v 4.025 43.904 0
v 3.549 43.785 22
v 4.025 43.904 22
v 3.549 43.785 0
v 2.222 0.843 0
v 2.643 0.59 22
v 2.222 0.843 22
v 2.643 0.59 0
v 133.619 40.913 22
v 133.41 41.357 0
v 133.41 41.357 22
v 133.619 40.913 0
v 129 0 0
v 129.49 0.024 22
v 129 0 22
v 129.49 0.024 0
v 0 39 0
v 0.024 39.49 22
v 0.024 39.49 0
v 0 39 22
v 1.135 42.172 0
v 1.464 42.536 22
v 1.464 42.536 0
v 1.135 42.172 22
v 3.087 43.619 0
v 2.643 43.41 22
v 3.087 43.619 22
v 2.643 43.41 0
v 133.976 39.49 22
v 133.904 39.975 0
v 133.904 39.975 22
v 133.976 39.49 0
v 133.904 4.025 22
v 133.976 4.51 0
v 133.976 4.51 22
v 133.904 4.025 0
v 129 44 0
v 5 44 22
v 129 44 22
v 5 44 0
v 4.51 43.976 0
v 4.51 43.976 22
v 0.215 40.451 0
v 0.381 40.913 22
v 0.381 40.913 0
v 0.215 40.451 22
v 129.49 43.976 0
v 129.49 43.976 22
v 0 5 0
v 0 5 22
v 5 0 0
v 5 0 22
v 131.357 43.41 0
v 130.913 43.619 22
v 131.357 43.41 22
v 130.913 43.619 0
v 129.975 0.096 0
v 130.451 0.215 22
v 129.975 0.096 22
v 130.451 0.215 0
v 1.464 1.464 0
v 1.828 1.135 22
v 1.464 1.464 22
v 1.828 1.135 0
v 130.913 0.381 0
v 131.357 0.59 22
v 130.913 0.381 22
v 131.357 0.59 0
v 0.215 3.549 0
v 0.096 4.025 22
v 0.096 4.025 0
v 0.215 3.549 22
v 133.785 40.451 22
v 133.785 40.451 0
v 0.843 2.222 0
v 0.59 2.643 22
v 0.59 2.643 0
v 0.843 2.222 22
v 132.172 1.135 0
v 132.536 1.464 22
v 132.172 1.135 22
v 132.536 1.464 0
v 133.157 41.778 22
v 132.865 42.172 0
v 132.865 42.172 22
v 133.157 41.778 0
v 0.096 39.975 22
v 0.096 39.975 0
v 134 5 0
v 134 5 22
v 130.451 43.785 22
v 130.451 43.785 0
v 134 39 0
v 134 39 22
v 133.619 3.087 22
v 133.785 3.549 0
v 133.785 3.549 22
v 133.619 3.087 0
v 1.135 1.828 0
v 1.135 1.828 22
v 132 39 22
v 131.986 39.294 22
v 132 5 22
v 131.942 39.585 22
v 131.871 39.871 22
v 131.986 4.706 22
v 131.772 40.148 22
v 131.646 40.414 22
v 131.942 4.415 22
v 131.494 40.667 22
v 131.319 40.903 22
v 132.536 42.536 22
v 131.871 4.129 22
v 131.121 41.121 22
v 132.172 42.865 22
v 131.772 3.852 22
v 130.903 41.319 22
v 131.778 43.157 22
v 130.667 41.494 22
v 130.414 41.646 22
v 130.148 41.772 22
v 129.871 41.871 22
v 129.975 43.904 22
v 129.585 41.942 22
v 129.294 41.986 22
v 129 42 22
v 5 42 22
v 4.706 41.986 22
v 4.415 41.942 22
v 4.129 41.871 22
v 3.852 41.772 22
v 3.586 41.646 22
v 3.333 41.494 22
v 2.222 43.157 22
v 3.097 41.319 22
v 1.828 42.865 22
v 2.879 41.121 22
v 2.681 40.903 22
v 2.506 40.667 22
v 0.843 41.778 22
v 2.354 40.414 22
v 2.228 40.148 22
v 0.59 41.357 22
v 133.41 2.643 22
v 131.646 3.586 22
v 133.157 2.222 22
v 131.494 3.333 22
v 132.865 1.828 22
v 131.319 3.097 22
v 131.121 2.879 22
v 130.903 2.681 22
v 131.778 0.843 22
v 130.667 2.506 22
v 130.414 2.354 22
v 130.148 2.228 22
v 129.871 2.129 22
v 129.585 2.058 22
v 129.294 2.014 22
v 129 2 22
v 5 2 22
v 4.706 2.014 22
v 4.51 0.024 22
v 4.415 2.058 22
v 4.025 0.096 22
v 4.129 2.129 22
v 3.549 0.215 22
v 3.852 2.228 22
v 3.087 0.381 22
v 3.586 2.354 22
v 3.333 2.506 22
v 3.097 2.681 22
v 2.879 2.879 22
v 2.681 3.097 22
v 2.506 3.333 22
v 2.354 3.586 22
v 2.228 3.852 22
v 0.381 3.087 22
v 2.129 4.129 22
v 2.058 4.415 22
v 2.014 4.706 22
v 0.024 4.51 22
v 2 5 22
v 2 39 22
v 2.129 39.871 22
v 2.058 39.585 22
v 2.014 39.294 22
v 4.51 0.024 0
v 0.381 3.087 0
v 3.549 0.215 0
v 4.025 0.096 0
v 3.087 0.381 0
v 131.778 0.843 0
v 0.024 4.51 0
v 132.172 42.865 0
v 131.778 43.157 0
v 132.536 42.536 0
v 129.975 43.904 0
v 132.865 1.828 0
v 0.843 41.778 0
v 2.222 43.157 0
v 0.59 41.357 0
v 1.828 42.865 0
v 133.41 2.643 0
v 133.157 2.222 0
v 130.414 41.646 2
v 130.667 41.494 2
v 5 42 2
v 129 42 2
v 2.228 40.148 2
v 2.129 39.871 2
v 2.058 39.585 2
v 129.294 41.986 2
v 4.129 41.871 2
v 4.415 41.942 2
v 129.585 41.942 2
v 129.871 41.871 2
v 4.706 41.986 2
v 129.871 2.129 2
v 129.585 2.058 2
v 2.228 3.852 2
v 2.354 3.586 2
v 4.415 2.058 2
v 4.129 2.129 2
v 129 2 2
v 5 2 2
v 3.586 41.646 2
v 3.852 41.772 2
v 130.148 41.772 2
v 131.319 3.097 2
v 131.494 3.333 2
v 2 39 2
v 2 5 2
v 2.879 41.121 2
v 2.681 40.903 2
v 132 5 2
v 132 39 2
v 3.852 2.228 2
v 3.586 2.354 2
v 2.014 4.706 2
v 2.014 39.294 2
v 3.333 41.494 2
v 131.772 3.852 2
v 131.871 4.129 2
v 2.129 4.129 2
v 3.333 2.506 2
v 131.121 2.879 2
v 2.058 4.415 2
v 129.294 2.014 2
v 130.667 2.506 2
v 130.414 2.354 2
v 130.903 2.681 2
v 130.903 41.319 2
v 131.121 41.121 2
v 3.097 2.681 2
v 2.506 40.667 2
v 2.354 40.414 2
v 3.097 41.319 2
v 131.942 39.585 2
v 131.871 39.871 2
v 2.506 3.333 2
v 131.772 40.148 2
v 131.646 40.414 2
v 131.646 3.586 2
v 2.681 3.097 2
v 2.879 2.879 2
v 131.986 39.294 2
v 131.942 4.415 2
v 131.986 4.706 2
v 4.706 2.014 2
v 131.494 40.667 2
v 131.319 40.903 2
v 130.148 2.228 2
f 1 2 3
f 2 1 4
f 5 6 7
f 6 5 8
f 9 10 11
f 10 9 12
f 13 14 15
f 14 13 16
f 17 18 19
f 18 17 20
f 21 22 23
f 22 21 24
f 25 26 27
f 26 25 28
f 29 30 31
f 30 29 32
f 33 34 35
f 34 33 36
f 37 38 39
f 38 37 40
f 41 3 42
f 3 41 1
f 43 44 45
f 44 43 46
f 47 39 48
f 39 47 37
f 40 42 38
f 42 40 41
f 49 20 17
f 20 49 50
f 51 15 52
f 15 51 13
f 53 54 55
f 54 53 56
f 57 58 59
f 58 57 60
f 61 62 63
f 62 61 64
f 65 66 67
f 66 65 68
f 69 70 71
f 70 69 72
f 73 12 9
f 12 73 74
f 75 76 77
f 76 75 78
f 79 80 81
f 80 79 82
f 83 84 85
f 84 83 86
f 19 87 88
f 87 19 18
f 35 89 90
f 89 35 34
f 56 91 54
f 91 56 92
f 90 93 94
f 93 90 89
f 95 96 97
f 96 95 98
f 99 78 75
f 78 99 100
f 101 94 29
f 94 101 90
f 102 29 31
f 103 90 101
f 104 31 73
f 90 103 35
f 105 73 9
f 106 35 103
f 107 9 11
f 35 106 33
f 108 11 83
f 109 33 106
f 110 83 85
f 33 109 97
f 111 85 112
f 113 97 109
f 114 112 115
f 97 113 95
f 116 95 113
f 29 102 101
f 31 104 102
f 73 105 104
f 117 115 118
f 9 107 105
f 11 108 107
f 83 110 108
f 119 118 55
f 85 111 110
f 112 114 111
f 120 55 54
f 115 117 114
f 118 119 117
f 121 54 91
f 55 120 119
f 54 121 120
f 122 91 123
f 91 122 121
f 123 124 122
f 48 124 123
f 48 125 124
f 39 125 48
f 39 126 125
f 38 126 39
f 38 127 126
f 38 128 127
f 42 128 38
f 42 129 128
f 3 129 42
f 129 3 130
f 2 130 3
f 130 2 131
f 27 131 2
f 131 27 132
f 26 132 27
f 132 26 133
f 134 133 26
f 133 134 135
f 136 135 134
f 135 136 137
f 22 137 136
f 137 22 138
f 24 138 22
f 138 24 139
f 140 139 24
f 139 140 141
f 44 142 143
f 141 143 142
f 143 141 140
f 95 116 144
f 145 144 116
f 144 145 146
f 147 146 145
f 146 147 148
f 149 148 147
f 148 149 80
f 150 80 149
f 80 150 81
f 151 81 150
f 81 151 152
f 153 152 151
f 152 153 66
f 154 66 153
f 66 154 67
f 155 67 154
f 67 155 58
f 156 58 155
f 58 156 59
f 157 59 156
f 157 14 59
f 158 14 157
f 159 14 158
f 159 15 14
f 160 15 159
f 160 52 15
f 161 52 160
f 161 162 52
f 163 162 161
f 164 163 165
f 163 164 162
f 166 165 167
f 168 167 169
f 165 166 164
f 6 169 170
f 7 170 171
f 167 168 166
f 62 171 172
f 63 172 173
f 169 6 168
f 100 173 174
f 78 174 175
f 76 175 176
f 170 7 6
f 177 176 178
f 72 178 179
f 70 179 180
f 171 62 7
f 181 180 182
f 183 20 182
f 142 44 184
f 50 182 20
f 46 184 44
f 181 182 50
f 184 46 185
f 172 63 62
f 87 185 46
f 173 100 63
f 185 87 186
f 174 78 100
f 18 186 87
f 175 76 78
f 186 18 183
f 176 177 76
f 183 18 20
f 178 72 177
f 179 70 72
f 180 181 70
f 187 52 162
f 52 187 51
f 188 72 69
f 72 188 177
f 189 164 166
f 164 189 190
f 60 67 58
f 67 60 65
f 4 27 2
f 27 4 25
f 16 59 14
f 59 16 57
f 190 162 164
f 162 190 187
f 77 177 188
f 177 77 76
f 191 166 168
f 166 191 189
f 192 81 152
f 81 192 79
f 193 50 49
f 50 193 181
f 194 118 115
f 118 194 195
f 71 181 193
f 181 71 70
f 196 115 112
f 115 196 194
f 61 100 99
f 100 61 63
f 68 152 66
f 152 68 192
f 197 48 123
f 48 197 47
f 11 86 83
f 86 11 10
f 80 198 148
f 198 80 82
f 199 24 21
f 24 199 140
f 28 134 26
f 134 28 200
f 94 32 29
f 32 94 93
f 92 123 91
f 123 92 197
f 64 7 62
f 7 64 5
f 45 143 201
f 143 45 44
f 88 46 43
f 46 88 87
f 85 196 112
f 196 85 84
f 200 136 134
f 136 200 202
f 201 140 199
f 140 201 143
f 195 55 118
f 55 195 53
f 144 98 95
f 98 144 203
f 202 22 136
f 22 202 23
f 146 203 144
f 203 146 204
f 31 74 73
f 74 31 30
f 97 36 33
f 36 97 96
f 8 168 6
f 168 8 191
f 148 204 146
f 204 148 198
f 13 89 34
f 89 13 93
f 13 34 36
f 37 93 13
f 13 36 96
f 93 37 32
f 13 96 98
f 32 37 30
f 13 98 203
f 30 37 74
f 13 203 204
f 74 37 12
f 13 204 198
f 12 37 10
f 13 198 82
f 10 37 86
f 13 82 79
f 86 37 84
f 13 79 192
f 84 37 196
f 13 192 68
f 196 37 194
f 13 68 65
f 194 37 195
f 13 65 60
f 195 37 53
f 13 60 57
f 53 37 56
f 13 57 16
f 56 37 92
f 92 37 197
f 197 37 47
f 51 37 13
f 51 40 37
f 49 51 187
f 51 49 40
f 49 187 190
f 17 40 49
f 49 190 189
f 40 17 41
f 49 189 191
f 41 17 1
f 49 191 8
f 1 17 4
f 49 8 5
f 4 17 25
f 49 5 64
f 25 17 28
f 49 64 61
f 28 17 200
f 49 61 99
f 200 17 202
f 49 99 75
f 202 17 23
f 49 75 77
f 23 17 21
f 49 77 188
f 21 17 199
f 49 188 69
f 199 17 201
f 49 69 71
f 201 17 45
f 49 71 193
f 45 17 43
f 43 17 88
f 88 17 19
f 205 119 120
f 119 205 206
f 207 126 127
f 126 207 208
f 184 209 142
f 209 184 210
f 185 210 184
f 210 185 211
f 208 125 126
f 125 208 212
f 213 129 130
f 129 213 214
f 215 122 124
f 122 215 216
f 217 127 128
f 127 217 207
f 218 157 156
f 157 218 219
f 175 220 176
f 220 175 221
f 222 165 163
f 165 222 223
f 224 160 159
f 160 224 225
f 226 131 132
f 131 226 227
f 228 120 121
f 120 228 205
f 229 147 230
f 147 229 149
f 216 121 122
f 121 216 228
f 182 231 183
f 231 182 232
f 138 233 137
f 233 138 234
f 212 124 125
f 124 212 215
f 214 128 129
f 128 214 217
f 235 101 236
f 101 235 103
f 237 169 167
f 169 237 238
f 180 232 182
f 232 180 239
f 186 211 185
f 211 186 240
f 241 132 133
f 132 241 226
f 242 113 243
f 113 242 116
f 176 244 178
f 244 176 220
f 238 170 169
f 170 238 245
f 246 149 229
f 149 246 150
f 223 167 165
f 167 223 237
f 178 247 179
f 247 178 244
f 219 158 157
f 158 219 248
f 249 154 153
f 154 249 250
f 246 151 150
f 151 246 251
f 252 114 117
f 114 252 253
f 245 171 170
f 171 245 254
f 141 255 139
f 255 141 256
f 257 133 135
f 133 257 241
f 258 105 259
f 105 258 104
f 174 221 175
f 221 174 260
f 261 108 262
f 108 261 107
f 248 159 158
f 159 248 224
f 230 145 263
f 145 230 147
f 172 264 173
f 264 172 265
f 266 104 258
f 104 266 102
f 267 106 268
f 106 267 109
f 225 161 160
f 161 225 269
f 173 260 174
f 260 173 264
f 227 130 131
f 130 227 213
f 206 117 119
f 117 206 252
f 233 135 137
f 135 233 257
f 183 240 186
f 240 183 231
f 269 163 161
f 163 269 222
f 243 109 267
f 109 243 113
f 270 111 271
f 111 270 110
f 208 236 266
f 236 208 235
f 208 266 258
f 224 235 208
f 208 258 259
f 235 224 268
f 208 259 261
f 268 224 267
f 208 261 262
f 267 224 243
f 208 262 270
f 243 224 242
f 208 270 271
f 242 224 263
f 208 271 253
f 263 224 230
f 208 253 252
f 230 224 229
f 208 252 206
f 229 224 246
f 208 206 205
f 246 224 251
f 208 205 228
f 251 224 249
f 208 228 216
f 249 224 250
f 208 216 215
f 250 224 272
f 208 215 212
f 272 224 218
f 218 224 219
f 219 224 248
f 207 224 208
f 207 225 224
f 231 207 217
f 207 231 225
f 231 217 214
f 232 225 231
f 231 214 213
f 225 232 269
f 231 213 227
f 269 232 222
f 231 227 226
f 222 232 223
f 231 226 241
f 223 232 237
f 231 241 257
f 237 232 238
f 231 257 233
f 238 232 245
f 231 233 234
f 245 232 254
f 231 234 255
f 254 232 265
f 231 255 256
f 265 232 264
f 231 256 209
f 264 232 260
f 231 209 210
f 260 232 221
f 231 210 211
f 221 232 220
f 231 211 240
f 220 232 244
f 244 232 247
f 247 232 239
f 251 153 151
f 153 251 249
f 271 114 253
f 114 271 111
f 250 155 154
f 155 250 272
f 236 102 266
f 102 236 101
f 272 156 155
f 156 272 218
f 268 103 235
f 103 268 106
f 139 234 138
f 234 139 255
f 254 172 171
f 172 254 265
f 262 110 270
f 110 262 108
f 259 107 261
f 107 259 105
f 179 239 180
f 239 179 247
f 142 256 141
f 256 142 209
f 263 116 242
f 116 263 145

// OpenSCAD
$fn=64;
$inner_x=130; //Width in mm
$inner_y=40; //Depth in mm
$inner_z=20; //Height in mm
$chamfer=5; //Chamfer in mm
$wall_width=2; //Wall thickness in mm
$floor_width=2; //Floor thickness in mm

//Differencing the 2 cubes to make the tray
difference(){
   //outer cube 
   roundedcube($inner_x+($wall_width*2),$inner_y+($wall_width*2),$inner_z+$floor_width,$chamfer);

   //Inner cube 
   translate([$wall_width,$wall_width,$floor_width])
   roundedcube($inner_x,$inner_y,$inner_z+5,$chamfer-2);
}


module roundedcube(xdim, ydim ,zdim, rdim){
    hull(){
    translate([rdim,rdim,0])cylinder(r=rdim,h=zdim);
    translate([xdim-rdim,rdim,0])cylinder(r=rdim,h=zdim);
    translate([rdim,ydim-rdim,0])cylinder(r=rdim,h=zdim);
    translate([xdim-rdim,ydim-rdim,0])cylinder(r=rdim,h=zdim);
    }
}
